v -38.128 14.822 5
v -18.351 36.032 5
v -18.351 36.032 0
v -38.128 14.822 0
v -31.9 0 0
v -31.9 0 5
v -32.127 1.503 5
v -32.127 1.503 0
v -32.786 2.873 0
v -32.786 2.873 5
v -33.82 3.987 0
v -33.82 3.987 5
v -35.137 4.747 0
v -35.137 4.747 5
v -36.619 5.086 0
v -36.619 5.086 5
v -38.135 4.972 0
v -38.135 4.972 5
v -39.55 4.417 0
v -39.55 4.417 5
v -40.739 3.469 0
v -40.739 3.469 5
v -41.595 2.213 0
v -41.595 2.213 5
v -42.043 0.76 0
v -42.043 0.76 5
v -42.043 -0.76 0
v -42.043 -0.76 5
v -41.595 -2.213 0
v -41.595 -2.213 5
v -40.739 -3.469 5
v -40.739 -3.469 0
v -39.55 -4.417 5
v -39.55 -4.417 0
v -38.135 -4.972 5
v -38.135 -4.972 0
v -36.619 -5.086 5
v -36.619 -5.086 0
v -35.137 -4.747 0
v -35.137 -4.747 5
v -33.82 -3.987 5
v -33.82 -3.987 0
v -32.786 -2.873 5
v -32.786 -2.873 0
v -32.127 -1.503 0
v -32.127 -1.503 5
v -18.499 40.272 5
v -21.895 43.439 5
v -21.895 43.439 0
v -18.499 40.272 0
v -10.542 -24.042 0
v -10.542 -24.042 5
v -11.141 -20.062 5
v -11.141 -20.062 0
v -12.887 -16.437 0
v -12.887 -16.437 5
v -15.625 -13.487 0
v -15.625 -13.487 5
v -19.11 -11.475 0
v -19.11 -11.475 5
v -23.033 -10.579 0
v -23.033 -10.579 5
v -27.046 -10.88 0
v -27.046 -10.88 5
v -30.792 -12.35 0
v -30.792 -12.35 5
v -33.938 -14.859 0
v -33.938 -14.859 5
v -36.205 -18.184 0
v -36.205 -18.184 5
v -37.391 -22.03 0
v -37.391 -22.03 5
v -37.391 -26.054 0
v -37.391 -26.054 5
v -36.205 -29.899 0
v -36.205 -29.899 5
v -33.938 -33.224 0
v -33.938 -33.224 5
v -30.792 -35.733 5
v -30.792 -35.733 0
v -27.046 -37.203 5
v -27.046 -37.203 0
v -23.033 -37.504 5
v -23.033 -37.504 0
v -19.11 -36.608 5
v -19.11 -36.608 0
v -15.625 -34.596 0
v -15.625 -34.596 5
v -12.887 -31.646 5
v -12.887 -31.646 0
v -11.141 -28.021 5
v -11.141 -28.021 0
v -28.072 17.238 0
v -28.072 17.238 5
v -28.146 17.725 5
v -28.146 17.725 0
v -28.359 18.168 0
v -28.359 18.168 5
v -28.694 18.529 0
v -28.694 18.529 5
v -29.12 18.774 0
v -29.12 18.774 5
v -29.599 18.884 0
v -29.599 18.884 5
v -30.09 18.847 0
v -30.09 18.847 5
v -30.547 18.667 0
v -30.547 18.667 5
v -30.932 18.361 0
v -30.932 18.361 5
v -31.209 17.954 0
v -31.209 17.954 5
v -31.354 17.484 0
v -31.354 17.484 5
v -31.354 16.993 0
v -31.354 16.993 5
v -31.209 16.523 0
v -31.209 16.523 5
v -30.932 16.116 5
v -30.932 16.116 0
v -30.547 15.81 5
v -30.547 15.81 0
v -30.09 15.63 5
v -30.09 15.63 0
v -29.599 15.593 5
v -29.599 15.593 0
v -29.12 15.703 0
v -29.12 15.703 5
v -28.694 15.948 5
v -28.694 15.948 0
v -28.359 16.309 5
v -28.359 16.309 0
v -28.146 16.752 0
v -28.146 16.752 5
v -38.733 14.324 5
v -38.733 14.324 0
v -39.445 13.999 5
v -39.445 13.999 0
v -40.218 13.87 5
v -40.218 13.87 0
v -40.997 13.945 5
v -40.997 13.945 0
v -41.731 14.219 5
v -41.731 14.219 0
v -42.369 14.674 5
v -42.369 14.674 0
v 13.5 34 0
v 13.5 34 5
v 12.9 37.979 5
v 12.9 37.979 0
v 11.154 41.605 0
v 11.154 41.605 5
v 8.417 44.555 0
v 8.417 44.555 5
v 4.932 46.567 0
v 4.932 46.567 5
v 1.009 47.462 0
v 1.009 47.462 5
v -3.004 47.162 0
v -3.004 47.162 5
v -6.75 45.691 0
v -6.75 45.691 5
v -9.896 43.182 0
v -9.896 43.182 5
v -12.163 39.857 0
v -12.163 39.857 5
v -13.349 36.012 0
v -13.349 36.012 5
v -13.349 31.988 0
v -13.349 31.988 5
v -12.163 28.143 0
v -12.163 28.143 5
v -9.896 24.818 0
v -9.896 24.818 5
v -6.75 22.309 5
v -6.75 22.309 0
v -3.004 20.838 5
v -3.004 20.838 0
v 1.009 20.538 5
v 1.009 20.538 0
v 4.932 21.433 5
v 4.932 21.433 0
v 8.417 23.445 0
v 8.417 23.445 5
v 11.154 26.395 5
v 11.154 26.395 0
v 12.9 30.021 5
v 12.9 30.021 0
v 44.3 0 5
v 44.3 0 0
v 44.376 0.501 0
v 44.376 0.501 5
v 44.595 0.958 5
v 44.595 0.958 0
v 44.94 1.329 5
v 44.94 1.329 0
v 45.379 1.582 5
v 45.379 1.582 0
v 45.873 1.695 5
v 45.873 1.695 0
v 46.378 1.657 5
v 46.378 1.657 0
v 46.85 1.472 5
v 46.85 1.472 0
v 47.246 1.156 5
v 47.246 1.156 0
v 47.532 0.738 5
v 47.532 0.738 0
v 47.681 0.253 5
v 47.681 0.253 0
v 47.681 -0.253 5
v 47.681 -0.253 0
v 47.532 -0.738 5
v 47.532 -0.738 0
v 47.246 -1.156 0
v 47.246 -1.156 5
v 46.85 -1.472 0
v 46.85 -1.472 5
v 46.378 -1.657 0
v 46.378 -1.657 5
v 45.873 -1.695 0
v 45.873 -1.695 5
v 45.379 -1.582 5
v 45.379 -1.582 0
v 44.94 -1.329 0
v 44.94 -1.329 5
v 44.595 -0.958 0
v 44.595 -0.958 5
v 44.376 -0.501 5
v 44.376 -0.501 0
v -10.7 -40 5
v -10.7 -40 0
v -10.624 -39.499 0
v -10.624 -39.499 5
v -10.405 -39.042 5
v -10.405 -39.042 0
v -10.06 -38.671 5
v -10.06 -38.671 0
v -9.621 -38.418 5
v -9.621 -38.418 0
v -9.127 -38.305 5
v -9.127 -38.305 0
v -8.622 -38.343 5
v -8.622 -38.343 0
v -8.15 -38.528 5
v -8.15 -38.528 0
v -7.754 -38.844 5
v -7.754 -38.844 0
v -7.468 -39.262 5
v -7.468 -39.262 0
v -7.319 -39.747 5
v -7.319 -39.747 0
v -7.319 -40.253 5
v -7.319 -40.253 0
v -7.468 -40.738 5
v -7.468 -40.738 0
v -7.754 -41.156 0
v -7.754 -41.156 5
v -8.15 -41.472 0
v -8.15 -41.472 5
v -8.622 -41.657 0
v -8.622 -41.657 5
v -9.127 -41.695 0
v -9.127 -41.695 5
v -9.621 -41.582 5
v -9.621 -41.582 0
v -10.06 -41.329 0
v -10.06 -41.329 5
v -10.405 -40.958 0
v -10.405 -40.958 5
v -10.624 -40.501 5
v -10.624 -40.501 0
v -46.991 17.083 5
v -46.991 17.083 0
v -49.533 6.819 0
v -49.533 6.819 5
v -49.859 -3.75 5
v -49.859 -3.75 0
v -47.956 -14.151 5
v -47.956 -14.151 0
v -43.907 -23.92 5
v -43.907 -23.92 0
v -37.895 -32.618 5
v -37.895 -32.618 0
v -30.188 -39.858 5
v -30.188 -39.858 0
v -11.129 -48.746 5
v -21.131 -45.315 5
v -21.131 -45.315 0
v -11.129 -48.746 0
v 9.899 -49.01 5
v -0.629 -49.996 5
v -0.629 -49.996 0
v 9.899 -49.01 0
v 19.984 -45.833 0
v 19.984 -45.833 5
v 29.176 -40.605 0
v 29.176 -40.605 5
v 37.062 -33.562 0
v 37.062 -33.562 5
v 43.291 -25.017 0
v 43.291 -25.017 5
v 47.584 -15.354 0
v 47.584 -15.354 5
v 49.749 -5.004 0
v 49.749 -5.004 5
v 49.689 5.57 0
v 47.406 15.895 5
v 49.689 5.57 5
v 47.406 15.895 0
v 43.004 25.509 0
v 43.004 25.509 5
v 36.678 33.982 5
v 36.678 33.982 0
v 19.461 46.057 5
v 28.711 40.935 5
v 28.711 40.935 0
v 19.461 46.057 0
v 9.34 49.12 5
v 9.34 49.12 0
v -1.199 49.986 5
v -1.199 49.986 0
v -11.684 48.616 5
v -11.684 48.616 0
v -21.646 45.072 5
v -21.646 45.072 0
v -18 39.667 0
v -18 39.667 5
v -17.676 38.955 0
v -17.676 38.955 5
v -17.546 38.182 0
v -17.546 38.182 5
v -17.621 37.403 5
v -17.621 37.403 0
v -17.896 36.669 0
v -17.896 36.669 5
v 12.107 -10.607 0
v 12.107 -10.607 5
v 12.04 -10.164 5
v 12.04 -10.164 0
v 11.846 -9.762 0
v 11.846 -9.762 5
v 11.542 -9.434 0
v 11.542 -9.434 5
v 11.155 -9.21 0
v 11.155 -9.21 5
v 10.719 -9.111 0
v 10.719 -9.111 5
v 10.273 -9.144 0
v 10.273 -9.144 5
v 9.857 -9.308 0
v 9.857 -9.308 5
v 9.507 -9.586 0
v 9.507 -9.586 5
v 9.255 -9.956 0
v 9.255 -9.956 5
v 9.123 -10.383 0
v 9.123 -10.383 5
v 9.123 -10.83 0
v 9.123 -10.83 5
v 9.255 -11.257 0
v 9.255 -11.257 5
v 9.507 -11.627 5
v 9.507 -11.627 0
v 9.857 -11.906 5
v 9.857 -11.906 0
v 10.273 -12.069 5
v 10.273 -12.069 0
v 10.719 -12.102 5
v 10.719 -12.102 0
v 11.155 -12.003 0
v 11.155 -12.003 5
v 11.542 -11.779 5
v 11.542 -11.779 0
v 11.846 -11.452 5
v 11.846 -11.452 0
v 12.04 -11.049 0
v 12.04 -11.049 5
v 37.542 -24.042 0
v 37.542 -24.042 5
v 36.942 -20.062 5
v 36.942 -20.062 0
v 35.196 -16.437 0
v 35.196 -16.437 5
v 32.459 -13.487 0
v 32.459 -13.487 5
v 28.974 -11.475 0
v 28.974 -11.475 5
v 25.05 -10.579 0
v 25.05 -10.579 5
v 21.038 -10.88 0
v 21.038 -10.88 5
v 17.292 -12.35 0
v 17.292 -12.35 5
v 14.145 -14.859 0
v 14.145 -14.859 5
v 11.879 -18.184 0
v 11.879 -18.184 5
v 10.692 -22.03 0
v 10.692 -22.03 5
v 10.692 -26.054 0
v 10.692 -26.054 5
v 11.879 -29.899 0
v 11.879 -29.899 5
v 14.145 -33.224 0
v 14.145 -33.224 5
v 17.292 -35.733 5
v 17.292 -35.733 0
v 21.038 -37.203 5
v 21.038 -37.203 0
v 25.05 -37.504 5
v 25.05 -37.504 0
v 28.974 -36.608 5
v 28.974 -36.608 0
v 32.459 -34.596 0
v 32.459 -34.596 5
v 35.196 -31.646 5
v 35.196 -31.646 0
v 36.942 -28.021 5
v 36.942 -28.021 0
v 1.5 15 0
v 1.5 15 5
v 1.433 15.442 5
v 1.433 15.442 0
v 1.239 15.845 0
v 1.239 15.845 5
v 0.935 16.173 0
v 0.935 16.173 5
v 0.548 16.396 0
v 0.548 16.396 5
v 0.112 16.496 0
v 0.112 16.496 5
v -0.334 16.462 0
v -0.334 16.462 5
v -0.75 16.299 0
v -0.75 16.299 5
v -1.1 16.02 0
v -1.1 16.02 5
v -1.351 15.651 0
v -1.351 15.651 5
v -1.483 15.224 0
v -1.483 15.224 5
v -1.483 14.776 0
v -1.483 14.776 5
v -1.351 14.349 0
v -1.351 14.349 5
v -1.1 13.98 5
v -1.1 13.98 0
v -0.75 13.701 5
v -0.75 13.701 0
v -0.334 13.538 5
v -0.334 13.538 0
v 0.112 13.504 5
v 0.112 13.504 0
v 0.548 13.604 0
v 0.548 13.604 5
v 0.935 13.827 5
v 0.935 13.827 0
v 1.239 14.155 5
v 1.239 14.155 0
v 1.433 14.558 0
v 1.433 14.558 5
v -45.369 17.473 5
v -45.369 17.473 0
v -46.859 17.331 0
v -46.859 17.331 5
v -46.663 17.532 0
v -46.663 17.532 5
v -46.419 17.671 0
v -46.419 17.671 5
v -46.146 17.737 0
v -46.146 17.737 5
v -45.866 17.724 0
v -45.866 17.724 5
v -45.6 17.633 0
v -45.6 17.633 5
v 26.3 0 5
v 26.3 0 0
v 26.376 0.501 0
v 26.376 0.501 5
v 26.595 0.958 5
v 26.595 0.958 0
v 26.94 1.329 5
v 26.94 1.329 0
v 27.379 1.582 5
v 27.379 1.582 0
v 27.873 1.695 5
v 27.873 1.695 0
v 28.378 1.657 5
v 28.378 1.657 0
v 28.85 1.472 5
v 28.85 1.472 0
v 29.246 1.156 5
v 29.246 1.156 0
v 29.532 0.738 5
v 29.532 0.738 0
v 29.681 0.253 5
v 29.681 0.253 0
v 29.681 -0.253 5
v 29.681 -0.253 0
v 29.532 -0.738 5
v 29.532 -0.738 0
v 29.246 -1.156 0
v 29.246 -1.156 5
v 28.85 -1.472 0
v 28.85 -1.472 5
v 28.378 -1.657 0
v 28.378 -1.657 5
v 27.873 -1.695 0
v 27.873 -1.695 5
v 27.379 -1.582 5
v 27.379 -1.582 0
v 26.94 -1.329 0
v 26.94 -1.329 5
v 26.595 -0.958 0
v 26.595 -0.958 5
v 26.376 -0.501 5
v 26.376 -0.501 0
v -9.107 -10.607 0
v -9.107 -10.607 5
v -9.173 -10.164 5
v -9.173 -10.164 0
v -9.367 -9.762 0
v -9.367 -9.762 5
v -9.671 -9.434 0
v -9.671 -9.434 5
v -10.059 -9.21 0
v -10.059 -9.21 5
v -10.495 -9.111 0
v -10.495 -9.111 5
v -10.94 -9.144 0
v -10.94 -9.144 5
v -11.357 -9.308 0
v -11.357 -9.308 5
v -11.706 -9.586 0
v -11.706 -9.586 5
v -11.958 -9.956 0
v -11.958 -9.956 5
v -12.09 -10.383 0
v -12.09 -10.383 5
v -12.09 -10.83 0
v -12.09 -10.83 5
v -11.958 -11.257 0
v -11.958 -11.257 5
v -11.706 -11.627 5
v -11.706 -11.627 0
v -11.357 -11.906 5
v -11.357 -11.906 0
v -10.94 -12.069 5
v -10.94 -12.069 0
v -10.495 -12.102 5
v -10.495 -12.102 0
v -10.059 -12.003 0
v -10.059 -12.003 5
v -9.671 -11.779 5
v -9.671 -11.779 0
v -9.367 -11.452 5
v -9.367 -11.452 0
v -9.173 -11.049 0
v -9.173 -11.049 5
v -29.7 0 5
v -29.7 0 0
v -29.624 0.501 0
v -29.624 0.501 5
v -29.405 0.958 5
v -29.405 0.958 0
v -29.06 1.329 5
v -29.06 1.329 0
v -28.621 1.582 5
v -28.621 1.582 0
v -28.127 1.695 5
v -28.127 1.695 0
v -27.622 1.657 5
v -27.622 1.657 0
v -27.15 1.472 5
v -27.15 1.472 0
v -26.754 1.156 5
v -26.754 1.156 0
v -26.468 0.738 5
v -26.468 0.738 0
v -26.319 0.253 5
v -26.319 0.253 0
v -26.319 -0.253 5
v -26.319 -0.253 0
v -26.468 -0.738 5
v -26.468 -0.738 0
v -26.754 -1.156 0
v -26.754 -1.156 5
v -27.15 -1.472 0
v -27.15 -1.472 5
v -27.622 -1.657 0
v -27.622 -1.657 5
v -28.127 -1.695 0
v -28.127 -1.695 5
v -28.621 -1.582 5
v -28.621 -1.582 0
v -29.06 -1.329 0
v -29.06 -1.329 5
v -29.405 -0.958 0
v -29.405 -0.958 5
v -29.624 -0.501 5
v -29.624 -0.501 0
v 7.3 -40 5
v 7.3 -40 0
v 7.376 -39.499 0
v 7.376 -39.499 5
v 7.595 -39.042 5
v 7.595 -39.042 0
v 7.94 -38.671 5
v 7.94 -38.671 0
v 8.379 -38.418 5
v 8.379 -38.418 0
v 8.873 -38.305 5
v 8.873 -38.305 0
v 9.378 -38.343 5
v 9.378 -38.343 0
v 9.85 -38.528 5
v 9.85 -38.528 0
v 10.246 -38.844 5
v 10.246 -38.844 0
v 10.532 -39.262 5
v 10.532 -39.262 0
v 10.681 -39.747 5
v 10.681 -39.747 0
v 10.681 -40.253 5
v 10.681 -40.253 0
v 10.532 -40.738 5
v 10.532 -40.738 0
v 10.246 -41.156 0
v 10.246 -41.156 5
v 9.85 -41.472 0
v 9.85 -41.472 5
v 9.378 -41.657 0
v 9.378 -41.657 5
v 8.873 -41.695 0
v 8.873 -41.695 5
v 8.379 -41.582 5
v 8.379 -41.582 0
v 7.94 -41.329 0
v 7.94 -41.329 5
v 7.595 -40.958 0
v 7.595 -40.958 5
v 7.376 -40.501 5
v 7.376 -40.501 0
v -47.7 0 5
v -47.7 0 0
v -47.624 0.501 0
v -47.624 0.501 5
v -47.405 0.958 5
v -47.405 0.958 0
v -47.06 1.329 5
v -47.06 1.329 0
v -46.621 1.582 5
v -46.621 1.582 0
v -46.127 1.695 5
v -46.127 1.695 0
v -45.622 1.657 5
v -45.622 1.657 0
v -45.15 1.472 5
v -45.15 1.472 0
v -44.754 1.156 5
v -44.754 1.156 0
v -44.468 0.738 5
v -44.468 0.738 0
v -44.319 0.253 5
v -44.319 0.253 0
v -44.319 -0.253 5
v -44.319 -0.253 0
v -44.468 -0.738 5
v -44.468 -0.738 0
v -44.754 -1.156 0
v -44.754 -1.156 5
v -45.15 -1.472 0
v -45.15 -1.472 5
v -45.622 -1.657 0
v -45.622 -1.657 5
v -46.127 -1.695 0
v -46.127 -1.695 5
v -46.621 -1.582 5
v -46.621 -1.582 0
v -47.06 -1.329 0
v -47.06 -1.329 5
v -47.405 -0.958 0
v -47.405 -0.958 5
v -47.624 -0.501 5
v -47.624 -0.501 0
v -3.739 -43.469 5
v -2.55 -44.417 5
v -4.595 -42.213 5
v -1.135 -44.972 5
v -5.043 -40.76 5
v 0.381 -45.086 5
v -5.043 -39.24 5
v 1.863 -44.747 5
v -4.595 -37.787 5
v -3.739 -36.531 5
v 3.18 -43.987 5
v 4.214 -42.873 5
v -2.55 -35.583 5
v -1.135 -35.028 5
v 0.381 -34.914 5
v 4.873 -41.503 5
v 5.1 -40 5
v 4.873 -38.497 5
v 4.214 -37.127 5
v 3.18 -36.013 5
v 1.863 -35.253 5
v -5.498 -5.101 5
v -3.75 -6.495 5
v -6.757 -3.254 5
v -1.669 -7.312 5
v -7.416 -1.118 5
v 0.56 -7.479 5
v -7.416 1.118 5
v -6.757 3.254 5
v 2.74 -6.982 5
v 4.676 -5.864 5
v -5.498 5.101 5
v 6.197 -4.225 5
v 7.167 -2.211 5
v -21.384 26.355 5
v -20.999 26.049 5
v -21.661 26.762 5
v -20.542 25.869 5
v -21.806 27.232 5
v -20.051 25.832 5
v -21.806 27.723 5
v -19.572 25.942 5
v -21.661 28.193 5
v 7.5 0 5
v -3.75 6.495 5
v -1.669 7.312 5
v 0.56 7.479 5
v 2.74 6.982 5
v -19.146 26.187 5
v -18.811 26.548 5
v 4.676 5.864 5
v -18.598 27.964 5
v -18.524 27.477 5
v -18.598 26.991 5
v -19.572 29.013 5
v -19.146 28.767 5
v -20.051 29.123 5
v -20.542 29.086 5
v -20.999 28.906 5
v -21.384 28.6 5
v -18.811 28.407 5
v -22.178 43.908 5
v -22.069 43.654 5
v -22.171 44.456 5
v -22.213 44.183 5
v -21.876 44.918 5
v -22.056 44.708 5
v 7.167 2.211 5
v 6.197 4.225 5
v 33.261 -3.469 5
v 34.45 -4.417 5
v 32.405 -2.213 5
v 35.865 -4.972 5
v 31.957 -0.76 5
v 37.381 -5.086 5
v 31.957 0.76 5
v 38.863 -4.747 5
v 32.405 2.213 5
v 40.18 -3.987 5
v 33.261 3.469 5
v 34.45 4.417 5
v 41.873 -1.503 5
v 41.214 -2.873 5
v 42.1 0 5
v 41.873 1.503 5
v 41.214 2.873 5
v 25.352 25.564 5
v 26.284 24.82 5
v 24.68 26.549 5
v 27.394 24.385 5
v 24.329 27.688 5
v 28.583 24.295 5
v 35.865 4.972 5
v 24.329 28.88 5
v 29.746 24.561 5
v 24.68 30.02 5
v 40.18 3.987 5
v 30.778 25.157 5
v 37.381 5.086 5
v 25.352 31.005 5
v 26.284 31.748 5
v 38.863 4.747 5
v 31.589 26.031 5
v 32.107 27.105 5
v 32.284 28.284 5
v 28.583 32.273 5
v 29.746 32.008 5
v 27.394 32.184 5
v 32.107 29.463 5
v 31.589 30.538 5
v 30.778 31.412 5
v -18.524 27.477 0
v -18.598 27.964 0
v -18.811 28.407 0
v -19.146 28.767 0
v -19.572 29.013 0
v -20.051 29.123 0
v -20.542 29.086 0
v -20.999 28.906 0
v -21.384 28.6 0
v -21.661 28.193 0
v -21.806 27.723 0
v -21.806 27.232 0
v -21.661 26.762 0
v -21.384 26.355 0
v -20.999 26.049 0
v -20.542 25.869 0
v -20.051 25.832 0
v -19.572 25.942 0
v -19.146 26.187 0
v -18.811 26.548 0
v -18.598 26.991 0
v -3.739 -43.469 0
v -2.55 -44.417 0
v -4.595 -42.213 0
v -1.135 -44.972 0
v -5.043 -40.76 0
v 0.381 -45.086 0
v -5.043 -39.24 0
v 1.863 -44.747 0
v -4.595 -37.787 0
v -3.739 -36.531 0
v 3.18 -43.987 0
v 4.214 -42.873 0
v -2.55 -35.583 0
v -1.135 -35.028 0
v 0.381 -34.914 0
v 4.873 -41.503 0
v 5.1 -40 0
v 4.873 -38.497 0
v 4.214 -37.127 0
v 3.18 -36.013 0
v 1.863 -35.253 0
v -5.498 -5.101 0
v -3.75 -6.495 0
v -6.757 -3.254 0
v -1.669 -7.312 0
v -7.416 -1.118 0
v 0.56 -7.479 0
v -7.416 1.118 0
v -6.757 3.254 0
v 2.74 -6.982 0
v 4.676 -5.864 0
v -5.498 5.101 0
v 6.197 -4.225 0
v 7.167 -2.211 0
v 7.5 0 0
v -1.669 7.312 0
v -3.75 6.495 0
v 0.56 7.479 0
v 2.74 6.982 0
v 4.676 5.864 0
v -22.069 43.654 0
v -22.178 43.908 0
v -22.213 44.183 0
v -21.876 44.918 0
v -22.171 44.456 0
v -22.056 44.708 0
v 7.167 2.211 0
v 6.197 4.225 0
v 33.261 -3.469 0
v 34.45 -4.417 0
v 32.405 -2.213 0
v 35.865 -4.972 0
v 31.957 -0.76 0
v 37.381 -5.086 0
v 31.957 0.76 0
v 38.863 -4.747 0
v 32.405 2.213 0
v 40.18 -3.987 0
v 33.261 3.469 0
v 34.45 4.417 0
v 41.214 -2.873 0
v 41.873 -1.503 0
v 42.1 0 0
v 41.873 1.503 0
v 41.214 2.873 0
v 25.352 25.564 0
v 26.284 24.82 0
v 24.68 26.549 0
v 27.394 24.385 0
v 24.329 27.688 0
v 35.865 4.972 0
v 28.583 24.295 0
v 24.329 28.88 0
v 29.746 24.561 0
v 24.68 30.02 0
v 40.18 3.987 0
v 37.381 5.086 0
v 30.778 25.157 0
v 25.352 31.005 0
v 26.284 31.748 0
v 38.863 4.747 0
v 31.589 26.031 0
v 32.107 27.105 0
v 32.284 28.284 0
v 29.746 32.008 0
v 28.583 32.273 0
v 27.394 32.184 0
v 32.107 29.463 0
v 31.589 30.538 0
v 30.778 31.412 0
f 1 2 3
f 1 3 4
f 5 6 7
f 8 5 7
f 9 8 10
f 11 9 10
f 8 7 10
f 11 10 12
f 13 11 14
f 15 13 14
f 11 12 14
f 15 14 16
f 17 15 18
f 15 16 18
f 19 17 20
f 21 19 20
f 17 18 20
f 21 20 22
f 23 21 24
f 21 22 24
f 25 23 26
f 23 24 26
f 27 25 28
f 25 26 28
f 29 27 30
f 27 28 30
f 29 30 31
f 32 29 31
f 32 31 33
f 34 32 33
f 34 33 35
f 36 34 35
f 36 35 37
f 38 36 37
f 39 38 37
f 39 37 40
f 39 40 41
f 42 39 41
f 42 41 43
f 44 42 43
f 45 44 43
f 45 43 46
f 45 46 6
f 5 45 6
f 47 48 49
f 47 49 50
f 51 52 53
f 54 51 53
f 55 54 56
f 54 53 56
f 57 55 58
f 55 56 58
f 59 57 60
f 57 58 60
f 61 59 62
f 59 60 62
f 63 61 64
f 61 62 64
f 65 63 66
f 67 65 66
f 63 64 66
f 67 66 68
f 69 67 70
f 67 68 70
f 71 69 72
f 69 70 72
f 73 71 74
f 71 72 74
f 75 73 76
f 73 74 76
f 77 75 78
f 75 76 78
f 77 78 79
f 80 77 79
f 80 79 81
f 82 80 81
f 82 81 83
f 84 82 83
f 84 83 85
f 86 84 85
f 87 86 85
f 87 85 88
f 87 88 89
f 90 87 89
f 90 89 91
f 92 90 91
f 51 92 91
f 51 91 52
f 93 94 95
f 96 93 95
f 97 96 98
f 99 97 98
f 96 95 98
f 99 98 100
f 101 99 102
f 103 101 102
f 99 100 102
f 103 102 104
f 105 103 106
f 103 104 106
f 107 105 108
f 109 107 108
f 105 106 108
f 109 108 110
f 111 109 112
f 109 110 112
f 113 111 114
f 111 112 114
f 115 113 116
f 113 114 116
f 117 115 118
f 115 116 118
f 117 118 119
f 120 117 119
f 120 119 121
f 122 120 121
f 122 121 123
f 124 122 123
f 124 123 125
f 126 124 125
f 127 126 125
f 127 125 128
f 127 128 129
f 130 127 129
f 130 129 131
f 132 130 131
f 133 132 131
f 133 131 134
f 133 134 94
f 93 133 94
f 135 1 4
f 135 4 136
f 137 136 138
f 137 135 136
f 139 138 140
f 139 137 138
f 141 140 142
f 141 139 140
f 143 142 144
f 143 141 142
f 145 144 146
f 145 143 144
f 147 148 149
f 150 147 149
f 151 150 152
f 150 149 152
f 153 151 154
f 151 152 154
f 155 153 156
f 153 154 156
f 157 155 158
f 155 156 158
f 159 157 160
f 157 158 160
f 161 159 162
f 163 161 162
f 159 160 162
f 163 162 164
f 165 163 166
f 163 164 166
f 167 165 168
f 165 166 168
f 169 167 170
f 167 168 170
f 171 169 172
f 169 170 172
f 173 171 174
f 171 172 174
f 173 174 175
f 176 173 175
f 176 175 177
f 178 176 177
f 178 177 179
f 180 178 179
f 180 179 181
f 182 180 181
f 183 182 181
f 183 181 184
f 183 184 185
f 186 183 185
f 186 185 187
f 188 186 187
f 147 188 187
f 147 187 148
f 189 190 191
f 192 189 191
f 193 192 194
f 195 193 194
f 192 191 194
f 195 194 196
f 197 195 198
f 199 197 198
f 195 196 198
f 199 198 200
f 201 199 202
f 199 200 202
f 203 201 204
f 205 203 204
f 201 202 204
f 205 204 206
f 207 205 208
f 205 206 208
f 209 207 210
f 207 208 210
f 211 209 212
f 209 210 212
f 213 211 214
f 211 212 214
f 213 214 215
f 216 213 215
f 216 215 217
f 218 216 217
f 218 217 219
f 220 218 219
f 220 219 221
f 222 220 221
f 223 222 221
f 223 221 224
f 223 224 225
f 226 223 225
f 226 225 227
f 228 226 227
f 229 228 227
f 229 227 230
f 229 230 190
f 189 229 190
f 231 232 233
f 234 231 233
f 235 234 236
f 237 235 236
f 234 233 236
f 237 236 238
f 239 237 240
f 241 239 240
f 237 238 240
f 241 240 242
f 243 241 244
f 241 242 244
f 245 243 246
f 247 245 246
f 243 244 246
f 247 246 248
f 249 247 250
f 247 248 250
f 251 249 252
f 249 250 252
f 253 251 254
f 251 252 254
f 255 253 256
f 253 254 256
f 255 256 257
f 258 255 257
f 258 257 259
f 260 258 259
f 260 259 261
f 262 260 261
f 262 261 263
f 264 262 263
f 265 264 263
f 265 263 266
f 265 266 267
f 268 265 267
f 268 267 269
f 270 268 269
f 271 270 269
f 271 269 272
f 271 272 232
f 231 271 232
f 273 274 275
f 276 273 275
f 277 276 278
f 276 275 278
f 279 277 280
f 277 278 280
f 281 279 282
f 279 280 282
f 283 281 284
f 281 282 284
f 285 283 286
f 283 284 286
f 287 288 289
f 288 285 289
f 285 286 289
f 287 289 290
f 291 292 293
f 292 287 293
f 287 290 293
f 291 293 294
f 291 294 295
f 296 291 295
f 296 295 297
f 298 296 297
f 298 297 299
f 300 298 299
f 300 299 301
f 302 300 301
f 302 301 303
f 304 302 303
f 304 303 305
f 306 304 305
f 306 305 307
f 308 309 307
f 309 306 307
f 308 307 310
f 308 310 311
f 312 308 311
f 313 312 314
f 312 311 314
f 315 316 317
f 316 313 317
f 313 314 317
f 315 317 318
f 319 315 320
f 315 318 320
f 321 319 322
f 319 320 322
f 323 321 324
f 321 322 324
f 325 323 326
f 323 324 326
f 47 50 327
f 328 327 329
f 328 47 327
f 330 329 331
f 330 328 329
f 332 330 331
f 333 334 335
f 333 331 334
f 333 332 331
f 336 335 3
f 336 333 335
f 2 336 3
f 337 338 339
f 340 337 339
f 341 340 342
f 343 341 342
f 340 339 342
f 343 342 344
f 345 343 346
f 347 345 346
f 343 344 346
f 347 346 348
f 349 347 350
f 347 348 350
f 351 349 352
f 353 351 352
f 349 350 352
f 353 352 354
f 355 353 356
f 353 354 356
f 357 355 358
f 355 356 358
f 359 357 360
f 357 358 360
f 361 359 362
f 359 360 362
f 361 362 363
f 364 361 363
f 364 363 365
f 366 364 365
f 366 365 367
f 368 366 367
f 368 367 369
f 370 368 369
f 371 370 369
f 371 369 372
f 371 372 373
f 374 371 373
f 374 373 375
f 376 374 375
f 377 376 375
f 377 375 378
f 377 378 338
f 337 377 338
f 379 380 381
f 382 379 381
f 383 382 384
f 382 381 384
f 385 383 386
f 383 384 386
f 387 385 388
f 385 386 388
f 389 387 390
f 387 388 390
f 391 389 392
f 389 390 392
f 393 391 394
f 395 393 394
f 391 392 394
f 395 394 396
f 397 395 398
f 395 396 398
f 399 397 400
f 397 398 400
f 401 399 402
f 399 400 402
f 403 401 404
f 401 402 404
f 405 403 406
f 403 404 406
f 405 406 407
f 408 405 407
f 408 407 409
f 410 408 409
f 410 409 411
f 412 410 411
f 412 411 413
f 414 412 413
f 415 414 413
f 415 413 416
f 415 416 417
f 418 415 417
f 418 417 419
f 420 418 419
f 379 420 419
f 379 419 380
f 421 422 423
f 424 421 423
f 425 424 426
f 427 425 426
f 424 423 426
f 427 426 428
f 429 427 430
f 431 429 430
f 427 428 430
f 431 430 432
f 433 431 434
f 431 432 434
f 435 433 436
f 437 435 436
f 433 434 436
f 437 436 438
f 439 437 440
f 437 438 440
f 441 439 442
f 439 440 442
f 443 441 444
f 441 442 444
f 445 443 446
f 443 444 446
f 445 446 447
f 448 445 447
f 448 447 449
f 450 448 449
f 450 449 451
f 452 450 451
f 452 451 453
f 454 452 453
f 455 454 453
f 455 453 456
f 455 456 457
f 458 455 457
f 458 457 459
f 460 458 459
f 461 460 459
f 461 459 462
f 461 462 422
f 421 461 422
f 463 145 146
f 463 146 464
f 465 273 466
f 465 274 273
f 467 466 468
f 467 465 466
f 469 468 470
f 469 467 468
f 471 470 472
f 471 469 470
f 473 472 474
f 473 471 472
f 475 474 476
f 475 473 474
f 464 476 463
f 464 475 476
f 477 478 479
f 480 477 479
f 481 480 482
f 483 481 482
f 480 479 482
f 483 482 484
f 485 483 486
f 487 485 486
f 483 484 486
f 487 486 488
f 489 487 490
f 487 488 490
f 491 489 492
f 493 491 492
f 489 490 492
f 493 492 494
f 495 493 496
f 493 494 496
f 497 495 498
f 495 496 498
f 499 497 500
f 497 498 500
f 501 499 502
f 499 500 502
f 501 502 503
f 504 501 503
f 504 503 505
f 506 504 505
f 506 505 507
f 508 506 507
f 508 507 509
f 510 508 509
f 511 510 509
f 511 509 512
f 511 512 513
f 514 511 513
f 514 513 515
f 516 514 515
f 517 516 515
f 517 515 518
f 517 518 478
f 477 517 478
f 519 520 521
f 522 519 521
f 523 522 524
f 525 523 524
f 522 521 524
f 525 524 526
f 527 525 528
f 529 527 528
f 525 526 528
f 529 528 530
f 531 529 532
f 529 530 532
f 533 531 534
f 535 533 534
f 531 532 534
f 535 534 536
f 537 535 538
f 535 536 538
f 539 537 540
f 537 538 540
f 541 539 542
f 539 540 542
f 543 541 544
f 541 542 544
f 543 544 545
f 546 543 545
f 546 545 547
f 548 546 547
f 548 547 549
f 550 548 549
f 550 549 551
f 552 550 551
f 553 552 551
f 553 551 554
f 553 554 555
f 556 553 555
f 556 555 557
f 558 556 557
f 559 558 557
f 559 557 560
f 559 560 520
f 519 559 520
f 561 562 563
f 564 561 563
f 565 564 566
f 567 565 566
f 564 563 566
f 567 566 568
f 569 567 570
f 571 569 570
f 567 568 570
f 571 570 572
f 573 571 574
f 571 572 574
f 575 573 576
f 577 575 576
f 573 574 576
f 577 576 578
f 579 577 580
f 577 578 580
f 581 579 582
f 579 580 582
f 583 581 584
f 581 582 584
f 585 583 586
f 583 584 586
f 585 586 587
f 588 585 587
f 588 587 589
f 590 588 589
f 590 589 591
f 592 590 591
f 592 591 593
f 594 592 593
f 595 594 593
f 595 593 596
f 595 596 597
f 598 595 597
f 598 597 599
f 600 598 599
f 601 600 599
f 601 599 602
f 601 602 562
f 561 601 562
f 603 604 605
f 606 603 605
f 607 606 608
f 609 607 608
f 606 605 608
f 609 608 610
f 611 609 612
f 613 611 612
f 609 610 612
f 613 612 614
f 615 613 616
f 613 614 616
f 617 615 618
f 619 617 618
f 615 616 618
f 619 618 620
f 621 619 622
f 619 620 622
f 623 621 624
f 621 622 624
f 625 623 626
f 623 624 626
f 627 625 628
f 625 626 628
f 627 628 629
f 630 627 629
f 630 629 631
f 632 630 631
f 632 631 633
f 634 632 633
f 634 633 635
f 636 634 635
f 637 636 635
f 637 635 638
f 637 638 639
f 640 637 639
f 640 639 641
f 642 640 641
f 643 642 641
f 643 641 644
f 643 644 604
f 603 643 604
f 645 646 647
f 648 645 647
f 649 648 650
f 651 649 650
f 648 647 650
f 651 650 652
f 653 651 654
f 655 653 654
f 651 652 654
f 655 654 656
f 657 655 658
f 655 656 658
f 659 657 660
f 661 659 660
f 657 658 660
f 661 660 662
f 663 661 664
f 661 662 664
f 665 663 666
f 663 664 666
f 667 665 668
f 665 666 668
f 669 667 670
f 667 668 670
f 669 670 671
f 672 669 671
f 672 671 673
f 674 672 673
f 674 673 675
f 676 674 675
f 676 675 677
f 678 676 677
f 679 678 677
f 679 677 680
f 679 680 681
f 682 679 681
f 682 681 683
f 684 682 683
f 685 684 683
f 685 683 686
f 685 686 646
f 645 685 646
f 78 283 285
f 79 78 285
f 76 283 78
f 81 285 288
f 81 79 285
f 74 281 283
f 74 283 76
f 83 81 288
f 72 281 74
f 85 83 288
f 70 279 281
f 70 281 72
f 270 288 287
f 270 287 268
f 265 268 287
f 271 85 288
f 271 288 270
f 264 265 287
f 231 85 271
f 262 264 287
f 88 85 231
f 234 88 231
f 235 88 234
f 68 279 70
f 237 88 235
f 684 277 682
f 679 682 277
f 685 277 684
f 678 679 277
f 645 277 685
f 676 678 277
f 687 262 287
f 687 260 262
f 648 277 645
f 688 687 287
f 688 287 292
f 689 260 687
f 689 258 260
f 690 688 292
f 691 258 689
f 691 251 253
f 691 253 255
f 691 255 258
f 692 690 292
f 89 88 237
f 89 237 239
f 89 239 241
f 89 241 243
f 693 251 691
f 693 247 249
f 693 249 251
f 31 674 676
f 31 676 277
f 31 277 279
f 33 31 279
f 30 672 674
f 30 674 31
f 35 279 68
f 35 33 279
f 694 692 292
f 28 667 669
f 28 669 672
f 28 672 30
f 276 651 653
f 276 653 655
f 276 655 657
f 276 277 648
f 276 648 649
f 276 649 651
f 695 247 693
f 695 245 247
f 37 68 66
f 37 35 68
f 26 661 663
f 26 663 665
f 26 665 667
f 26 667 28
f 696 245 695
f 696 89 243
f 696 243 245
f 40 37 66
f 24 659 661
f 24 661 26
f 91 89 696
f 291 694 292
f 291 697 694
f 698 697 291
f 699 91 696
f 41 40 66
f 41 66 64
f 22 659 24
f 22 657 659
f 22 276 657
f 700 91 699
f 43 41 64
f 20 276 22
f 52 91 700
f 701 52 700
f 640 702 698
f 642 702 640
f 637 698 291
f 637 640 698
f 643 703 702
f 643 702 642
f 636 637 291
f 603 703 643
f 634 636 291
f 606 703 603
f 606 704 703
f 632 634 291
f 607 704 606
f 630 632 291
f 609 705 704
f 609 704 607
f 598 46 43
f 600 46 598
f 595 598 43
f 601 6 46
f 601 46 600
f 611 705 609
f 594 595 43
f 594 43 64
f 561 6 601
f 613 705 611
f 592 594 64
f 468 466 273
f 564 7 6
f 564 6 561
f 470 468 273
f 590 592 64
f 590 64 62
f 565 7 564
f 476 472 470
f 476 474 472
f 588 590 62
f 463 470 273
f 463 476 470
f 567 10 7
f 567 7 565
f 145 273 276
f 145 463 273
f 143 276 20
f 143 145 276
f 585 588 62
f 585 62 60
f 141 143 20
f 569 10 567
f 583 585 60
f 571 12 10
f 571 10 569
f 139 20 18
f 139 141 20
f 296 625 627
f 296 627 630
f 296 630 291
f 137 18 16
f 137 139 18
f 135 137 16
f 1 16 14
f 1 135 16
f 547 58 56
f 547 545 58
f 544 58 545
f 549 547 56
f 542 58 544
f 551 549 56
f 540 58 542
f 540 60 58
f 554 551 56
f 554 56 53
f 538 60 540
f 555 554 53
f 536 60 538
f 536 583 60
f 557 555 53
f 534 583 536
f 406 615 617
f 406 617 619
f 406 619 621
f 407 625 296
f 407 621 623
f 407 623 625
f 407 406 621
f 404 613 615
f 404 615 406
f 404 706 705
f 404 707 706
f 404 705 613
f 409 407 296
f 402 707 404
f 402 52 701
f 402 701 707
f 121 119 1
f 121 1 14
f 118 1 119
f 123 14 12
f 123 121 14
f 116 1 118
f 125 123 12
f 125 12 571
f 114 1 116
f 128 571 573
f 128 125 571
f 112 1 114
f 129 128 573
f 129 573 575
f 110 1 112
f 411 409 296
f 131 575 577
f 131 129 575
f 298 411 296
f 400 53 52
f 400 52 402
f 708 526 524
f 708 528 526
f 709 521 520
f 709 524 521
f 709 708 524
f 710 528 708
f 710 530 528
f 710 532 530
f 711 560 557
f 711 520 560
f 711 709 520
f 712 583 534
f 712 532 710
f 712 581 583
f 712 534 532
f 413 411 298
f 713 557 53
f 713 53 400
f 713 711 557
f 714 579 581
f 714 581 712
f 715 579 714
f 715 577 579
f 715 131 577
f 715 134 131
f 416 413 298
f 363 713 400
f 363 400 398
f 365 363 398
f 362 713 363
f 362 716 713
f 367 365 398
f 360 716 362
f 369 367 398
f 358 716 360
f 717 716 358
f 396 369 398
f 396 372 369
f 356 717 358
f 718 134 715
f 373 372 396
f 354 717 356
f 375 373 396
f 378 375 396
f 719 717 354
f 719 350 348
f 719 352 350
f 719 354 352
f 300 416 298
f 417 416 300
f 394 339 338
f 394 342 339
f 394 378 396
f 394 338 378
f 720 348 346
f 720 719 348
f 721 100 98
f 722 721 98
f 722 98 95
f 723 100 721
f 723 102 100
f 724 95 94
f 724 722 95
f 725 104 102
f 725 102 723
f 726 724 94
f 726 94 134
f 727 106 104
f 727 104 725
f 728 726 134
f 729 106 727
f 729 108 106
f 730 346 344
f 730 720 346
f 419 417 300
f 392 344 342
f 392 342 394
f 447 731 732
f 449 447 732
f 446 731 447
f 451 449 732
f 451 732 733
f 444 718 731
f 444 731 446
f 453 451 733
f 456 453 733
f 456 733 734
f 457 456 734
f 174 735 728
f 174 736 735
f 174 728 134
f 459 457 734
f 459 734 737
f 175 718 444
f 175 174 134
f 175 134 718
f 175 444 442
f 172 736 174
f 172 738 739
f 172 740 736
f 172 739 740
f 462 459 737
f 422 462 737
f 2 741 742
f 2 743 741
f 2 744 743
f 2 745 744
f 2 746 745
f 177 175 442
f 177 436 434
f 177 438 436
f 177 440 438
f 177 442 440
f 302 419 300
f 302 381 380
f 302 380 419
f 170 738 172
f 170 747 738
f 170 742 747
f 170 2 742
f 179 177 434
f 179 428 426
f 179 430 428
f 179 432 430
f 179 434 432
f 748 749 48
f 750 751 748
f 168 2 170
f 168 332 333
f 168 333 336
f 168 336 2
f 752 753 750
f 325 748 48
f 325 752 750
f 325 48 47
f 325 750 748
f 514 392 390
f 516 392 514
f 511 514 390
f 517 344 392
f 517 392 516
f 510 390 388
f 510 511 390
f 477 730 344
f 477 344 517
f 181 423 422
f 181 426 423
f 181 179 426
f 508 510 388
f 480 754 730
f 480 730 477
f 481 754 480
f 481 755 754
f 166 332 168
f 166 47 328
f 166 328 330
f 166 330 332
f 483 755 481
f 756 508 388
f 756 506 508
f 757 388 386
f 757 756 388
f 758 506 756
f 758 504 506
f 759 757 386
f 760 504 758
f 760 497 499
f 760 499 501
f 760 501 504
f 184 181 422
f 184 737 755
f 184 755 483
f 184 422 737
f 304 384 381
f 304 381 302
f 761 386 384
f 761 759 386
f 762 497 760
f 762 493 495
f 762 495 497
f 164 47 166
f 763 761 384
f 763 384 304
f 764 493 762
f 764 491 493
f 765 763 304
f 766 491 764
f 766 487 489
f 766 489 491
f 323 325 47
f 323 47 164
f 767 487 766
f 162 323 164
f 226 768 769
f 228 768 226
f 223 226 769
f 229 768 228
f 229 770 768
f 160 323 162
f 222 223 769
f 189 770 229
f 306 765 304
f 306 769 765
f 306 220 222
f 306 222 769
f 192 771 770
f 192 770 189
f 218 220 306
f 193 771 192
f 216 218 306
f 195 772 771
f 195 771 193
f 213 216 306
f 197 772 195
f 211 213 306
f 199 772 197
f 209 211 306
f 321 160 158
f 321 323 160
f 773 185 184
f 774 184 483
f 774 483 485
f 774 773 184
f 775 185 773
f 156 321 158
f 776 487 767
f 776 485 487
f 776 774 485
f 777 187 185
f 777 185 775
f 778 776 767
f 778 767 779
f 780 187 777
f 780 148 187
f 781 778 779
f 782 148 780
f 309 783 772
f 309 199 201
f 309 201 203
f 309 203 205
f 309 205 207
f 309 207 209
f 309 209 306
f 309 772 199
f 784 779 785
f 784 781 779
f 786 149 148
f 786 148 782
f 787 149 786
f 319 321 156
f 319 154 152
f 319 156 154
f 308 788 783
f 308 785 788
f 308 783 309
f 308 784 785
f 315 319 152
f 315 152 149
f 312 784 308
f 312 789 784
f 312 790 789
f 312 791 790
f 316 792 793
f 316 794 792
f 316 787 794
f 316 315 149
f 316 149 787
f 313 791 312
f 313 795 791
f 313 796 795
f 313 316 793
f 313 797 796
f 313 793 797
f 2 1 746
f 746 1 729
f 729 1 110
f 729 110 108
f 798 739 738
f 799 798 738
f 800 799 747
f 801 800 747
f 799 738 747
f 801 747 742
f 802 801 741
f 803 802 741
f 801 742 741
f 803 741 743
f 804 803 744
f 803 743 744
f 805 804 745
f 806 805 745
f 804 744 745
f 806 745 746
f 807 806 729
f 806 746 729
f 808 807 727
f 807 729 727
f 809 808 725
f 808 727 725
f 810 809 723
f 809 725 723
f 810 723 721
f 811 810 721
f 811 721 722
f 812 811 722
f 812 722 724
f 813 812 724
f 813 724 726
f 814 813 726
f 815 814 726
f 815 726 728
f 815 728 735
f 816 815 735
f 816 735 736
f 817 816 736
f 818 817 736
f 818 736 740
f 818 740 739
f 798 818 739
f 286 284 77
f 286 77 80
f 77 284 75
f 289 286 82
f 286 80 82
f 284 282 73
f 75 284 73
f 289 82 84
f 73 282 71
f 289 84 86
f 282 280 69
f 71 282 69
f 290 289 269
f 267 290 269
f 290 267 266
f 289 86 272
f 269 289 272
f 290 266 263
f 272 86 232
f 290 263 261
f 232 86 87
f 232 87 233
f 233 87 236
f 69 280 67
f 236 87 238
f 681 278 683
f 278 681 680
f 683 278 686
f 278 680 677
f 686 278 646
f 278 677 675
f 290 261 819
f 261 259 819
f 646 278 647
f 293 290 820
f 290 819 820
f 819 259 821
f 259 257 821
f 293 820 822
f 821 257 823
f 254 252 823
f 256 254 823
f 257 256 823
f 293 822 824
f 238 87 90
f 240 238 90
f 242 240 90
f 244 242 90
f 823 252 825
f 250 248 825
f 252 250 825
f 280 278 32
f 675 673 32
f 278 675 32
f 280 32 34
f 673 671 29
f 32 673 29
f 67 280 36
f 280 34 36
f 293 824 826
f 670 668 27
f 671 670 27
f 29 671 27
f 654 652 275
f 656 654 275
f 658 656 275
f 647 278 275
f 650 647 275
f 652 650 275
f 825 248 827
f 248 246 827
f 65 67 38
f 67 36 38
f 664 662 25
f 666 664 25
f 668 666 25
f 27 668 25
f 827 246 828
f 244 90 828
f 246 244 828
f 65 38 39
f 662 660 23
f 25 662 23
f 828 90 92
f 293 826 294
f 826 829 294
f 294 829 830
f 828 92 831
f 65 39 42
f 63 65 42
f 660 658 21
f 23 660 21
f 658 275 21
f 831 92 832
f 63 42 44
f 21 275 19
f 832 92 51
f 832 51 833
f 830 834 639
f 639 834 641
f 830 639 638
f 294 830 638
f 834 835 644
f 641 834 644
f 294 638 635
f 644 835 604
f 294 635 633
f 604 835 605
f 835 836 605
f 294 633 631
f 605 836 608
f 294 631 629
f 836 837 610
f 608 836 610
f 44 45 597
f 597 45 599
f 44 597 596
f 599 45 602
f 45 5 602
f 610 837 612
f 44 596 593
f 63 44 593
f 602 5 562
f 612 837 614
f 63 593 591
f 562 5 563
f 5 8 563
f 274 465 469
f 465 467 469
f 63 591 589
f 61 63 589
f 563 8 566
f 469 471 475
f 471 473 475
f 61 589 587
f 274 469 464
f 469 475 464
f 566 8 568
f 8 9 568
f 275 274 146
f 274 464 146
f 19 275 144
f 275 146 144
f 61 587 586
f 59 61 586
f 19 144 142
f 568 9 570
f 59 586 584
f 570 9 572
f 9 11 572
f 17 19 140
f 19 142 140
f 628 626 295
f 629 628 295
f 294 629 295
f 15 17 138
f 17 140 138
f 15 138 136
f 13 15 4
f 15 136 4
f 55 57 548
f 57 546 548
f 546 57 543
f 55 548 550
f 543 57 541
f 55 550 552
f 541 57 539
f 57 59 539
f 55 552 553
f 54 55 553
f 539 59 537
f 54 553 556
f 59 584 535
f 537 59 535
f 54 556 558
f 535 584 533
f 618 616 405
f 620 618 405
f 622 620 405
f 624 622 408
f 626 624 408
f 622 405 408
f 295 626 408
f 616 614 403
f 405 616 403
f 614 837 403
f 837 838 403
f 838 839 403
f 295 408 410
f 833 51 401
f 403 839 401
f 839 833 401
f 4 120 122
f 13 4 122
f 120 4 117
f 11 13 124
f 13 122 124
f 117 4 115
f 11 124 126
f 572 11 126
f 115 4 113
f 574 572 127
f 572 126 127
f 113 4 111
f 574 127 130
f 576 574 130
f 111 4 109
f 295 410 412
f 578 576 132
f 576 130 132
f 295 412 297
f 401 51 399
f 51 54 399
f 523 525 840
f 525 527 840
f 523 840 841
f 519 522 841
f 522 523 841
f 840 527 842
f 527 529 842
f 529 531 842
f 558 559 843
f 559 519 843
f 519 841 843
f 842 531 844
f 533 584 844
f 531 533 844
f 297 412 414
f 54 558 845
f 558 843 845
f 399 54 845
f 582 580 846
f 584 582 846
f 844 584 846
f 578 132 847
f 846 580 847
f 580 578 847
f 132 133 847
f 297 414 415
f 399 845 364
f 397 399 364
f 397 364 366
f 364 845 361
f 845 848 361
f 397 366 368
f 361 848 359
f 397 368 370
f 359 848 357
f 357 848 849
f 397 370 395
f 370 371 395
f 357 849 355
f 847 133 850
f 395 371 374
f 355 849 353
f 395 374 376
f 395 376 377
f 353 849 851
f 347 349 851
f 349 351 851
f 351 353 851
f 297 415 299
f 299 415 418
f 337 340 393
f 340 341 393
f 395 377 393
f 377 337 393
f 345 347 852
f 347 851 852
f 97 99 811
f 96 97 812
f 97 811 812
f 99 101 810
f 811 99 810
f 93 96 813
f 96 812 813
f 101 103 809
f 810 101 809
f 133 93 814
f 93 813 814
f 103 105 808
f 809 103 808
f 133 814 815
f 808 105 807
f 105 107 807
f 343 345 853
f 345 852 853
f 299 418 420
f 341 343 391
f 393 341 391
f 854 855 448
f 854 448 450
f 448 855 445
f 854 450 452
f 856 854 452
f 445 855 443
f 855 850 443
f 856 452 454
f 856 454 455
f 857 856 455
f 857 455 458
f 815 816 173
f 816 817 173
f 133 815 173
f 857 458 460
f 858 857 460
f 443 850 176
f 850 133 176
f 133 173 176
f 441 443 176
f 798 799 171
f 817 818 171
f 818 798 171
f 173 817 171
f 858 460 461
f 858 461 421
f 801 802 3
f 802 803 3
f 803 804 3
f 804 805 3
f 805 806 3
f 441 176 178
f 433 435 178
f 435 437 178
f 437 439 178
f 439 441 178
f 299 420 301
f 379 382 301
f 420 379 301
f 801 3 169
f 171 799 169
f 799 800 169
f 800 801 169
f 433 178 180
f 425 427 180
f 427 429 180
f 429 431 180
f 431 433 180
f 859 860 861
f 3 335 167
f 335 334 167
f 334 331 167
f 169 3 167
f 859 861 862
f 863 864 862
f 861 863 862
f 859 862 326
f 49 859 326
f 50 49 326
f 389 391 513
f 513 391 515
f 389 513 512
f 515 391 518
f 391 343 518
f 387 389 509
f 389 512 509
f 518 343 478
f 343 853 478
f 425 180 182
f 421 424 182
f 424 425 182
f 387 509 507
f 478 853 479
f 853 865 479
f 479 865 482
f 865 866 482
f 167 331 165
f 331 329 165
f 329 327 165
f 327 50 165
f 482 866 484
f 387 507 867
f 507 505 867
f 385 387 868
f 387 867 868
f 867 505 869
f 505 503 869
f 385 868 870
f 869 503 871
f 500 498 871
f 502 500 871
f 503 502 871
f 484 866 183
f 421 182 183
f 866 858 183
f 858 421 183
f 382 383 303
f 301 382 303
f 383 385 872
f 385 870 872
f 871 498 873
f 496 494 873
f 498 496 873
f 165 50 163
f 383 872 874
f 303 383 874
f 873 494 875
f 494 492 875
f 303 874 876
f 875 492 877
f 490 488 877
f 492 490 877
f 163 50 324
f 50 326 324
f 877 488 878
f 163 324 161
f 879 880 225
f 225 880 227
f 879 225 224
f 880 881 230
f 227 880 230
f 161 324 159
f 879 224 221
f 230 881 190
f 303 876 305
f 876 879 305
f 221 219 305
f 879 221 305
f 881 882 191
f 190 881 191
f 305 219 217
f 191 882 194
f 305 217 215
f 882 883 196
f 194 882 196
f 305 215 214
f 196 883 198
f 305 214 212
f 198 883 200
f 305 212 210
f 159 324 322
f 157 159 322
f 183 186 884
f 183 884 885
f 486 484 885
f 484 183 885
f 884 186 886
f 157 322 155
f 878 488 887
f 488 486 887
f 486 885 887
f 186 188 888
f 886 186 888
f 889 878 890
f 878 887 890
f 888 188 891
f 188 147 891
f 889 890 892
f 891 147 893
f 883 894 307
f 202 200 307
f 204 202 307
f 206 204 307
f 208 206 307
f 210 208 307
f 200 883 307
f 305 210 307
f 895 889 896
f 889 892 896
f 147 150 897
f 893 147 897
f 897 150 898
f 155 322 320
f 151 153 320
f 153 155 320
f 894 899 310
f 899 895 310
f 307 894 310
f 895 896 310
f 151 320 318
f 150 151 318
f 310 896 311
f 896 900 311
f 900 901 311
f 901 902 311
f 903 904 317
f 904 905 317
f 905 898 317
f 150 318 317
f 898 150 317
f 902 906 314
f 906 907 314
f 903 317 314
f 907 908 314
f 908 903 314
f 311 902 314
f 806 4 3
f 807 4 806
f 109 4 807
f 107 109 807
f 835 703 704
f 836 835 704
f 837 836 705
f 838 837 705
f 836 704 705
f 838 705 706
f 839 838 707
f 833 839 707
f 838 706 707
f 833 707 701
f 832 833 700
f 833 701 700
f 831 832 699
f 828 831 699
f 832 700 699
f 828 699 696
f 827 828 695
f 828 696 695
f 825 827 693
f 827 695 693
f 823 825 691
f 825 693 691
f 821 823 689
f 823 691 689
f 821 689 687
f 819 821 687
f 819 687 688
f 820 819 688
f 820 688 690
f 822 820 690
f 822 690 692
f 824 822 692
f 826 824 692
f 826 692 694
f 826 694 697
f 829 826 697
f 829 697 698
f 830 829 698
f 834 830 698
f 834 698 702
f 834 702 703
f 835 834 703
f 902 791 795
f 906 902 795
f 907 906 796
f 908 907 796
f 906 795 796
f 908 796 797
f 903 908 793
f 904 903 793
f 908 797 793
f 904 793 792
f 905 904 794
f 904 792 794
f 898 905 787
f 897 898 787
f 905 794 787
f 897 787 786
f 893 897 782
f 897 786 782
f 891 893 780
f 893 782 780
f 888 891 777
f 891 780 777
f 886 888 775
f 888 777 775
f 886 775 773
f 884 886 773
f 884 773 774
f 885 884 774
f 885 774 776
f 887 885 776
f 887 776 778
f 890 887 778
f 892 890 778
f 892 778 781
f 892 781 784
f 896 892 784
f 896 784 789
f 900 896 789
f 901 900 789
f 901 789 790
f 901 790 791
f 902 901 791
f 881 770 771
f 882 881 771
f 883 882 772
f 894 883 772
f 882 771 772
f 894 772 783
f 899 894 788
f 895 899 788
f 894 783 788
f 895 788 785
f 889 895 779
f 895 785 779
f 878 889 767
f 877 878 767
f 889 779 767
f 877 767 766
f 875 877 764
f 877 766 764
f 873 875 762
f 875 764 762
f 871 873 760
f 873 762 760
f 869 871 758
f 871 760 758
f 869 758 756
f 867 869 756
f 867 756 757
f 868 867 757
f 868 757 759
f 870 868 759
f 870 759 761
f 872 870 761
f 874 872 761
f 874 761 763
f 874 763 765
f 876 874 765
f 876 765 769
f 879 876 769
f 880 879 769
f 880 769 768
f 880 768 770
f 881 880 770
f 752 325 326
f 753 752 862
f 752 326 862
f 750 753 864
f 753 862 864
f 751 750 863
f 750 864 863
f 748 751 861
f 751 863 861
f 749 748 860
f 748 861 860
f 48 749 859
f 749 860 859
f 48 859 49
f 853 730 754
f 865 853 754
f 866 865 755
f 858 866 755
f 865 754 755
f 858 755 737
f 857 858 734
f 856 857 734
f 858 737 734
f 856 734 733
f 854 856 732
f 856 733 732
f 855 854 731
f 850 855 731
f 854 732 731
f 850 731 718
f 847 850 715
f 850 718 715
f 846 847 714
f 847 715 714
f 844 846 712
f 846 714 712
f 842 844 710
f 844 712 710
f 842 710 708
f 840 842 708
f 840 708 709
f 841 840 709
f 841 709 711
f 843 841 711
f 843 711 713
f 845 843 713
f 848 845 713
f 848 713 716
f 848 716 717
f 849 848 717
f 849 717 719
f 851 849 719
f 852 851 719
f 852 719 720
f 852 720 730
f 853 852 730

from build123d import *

# Parameters (mm, degrees)
SKETCH1_R                    = 50
BOSS_EXTRUDE1_DEPTH          = 5
F_15_0_15_DIAMETER_HOLE1_D   = 15
F_10_2_10_2_DIAMETER_HOLE1_D = 10.2
M3_CLEARANCE_HOLE1_D         = 3.4
SKETCH9_R                    = 13.5
SKETCH9_R_2                  = 1.5
CUT_EXTRUDE1_DEPTH           = 10
SKETCH10_R                   = 1.65
CUT_EXTRUDE2_DEPTH           = 10
SKETCH13_R                   = 4
CUT_EXTRUDE6_DEPTH           = 10
FILLET1_R                    = 1


with BuildPart() as part:
    # Sketch1 → Boss-Extrude1 (new body)
    with BuildSketch(Plane.XY):
        Circle(SKETCH1_R)
    extrude(amount=BOSS_EXTRUDE1_DEPTH)

    # Ø15.0 (15) Diameter Hole1 (through all)
    with Locations(Plane(origin=(0, 0, 0), x_dir=(-1, 0, 0), z_dir=(0, 0, -1))):
        with Locations((0, 0)):
            Hole(F_15_0_15_DIAMETER_HOLE1_D / 2)

    # Ø10.2 (10.2) Diameter Hole1 (through all)
    with Locations(Plane(origin=(0, 0, 0), x_dir=(-1, 0, 0), z_dir=(0, 0, -1))):
        with Locations((37, 0), (-37, 0), (0, -40)):
            Hole(F_10_2_10_2_DIAMETER_HOLE1_D / 2)

    # M3 Clearance Hole1 (through all)
    with Locations(Plane.XY.offset(5)):
        with Locations((46, 0), (28, 0), (9, -40), (-9, -40), (-46, 0), (-28, 0)):
            Hole(M3_CLEARANCE_HOLE1_D / 2)

    # Sketch9 → Cut-Extrude1 (cut)
    with BuildSketch(Plane.XY.offset(5)):
        with Locations((24.04163056, -24.04163056)):
            Circle(SKETCH9_R)
        with Locations((10.606601718, -10.606601718)):
            Circle(SKETCH9_R_2)
        with Locations((-24.04163056, -24.04163056)):
            Circle(SKETCH9_R)
        with Locations((-10.606601718, -10.606601718)):
            Circle(SKETCH9_R_2)
        with Locations((0, 34)):
            Circle(SKETCH9_R)
        with Locations((0, 15)):
            Circle(SKETCH9_R_2)
    extrude(amount=-CUT_EXTRUDE1_DEPTH, mode=Mode.SUBTRACT)

    # Sketch10 → Cut-Extrude2 (cut)
    with BuildSketch(Plane.XY.offset(5)):
        with Locations((-20.17442319, 27.477446333)):
            Circle(SKETCH10_R)
        with Locations((-29.722400231, 17.23849451)):
            Circle(SKETCH10_R)
        with BuildLine():
            Line((-27.274837591, 48.455628221), (-18.498593172, 40.2716479))
            ThreePointArc((-18.498593172, 40.2716479), (-17.546415771, 38.182285285), (-18.350527147, 36.031591715))
            Line((-18.350527147, 36.031591715), (-38.128479589, 14.822334368))
            ThreePointArc((-38.128479589, 14.822334368), (-40.217842204, 13.870156967), (-42.368535774, 14.674268343))
            Line((-42.368535774, 14.674268343), (-51.144780194, 22.858248664))
            Line((-51.144780194, 22.858248664), (-27.274837591, 48.455628221))
        make_face()
    extrude(amount=-CUT_EXTRUDE2_DEPTH, mode=Mode.SUBTRACT)

    # Sketch13 → Cut-Extrude6 (cut)
    with BuildSketch(Plane.XY.offset(5)):
        with Locations((28.284271247, 28.284271247)):
            Circle(SKETCH13_R)
    extrude(amount=-CUT_EXTRUDE6_DEPTH, mode=Mode.SUBTRACT)

    # Fillet1
    fillet1_edges = [part.edges().sort_by_distance(p)[0] for p in [
        (-22.949421323, 44.422112297, 2.5),
        (-46.456878561, 18.486709669, 2.5),
    ]]
    fillet(fillet1_edges, radius=FILLET1_R)


solid = part.part
